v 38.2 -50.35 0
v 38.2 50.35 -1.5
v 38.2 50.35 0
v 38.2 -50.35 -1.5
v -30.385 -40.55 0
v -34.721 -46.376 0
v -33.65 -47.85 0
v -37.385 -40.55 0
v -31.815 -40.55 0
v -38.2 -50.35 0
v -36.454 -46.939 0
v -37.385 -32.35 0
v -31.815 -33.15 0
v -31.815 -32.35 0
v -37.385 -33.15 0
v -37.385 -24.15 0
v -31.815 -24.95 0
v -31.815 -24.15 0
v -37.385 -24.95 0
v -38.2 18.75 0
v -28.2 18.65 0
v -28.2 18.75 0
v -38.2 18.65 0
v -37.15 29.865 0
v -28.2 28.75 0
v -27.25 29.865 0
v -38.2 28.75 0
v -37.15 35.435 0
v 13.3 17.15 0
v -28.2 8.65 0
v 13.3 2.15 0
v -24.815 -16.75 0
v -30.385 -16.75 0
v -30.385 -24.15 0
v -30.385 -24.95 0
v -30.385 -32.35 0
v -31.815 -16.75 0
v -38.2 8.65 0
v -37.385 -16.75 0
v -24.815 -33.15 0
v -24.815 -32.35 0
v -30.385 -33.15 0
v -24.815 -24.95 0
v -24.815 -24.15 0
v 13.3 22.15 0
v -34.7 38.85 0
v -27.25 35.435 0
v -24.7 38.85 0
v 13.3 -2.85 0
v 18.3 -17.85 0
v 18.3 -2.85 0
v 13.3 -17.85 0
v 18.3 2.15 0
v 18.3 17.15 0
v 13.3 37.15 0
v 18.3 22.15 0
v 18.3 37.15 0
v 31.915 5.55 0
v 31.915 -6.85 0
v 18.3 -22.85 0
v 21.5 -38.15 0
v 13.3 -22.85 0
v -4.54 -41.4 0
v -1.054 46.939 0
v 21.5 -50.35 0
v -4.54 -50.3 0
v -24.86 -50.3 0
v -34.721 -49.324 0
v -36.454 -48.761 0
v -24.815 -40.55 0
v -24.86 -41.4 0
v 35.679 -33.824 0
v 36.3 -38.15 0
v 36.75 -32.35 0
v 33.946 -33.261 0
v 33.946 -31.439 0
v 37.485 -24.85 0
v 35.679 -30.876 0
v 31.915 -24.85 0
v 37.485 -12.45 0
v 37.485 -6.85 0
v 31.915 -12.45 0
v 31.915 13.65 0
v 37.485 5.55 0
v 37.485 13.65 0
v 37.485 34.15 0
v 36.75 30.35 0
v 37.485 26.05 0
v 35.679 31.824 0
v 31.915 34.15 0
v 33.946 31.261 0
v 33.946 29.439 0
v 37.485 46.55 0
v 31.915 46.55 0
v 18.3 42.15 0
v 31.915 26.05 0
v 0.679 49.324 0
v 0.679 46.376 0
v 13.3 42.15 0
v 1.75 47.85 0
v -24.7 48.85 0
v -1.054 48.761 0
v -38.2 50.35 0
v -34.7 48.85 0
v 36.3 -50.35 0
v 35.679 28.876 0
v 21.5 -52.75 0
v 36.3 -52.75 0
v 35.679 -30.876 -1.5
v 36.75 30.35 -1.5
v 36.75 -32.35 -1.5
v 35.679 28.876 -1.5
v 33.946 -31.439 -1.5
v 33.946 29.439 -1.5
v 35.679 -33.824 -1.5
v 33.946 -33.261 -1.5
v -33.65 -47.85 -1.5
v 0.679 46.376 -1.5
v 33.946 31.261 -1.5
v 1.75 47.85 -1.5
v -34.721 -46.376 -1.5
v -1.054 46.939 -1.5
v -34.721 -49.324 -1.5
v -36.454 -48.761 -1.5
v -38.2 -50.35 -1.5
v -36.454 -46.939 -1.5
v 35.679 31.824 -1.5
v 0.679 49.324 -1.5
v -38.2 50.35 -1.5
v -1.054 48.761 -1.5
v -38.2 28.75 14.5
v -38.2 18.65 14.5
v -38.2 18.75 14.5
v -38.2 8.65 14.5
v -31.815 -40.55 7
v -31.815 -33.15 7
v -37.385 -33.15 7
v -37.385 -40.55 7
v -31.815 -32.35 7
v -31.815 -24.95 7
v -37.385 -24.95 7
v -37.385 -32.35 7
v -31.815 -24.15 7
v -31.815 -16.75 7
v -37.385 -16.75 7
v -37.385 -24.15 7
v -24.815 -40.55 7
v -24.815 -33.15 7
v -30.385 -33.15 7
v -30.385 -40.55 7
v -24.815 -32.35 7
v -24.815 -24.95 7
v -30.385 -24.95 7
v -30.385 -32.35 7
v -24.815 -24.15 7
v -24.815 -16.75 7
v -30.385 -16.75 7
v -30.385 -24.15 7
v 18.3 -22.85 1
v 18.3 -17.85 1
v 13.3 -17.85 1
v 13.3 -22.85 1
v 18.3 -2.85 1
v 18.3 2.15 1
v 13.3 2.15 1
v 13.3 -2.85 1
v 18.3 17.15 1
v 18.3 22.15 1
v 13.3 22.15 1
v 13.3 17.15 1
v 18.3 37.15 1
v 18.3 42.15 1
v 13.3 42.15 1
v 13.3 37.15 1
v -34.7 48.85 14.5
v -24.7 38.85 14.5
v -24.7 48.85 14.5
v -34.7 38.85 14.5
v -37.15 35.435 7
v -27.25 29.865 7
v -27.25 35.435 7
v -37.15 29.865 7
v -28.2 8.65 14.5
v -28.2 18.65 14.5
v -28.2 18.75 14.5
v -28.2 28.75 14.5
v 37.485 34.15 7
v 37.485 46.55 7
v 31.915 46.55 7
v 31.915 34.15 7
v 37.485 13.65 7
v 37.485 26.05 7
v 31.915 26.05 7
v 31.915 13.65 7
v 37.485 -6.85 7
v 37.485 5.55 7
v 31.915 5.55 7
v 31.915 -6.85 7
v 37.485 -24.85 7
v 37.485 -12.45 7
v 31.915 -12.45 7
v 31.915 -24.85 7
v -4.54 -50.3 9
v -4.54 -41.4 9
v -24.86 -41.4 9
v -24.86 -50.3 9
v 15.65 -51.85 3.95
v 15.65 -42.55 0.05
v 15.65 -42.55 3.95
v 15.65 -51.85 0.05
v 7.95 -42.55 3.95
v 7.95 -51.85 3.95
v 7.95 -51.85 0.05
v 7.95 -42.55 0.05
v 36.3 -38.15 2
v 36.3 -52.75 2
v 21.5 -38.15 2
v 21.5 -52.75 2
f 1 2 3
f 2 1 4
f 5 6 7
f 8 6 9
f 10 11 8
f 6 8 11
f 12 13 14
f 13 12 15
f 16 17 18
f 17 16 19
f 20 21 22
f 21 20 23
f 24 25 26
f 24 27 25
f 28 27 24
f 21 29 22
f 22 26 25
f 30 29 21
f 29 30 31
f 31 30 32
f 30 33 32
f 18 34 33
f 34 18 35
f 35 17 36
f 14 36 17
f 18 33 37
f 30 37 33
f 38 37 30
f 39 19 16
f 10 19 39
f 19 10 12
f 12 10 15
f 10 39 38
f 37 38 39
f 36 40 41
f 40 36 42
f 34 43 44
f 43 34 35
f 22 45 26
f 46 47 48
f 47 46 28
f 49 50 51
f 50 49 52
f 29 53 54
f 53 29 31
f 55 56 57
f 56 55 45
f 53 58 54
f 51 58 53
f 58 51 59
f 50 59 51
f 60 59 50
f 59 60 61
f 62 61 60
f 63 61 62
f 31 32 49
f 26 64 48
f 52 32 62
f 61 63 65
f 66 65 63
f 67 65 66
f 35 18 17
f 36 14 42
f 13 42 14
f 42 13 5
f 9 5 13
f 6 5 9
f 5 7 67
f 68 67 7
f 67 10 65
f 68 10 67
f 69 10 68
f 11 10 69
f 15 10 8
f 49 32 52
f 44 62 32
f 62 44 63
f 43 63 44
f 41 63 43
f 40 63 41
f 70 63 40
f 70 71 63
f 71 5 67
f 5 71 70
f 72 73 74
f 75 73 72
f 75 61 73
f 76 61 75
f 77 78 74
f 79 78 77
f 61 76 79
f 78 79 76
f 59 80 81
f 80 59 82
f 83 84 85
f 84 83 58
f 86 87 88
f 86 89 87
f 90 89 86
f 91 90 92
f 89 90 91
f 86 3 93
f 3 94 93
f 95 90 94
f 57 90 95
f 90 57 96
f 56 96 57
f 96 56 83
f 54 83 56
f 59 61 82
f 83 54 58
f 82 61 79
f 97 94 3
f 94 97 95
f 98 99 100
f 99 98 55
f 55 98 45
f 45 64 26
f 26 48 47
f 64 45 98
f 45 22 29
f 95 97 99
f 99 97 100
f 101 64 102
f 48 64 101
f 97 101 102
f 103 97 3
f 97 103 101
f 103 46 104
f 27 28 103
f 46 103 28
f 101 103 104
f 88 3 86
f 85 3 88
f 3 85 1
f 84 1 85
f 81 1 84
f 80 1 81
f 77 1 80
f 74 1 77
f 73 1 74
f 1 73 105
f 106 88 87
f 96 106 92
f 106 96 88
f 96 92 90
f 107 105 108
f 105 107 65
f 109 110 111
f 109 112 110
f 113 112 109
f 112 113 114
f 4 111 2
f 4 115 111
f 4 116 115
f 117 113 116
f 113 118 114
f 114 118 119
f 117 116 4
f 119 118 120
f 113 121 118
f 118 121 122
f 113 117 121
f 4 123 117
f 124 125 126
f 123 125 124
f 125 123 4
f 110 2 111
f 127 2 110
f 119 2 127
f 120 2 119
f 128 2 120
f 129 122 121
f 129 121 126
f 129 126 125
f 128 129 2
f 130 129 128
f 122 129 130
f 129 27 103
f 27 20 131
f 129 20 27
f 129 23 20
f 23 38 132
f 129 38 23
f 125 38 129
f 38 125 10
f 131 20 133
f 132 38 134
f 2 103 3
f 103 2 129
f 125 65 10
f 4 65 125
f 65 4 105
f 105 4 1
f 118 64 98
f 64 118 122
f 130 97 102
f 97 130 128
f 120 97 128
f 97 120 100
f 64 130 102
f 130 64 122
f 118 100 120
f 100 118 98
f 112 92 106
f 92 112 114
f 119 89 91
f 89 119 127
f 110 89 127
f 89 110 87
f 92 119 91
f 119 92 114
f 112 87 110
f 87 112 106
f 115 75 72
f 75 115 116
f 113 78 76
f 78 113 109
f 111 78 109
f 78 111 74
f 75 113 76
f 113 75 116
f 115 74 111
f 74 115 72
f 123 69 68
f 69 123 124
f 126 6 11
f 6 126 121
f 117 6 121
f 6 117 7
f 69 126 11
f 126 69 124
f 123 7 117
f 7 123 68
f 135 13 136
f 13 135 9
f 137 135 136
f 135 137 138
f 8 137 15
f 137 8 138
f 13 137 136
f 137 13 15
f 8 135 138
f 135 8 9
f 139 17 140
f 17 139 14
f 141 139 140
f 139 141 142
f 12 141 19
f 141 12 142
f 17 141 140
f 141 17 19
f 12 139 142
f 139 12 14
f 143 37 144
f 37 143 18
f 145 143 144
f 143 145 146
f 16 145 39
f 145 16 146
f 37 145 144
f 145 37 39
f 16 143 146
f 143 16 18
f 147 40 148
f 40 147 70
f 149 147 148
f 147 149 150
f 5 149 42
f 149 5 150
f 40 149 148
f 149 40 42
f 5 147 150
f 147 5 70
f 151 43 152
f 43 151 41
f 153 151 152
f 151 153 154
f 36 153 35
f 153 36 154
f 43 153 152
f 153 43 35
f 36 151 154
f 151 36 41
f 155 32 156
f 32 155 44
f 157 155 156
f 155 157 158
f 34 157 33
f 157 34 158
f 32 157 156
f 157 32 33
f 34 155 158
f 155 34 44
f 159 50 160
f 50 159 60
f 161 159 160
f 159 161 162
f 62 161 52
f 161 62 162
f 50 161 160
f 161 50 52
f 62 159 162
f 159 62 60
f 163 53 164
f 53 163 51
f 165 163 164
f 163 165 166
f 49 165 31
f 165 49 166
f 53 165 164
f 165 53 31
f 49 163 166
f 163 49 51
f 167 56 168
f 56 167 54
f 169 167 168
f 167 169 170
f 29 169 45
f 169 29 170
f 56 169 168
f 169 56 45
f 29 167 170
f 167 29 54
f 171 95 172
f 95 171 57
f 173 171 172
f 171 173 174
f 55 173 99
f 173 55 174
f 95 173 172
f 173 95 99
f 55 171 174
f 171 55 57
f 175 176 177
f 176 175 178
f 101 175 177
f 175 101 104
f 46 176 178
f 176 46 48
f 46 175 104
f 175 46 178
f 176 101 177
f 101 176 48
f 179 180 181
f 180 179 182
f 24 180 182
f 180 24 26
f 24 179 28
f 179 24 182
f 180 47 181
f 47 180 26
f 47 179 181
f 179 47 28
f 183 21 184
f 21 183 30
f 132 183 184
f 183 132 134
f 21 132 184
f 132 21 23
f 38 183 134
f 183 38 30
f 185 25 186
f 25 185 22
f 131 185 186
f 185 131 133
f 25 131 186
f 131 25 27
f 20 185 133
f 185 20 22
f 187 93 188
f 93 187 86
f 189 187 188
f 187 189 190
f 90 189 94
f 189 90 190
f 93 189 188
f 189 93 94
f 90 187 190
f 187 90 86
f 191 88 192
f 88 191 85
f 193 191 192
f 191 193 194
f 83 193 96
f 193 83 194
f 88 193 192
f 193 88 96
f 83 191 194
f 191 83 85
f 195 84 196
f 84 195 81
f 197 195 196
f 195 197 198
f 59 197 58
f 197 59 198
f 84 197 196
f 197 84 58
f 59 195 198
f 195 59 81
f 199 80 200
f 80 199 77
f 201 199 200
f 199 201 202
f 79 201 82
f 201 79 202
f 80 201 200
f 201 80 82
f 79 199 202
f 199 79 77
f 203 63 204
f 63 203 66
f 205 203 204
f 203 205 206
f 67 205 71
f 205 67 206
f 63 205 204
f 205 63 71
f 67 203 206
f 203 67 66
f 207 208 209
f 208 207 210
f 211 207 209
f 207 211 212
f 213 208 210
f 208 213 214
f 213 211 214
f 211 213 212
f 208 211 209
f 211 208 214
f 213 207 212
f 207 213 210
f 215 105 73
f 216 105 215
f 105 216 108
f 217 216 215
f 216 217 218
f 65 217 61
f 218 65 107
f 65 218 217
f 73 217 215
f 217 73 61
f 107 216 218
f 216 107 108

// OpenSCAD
fudge=0.1;

enderPCB();

module enderPCB(){
  PCBwdth=76.4;
  PCBhght=100.7;
  PCBthck=1.5;
  translate([-PCBwdth/2,-PCBhght/2,0]){
    difference(){
      color("green") translate([0,0,-1.5]) cube([PCBwdth,PCBhght,PCBthck]);
      translate([38.4,PCBhght-2.5,-1.5-fudge/2]) cylinder(d=3.1,h=1.5+fudge);
      translate([PCBwdth-3,PCBhght-20,-1.5-fudge/2]) cylinder(d=3.1,h=1.5+fudge);
      translate([PCBwdth-3,18,-1.5-fudge/2]) cylinder(d=3.1,h=1.5+fudge);
      translate([3,2.5,-1.5-fudge/2]) cylinder(d=3.1,h=1.5+fudge);
    }
    translate([8.5,PCBhght-6.5,0]) rotate([0,0,90]) screwTerminal(); //VIN
    translate([6,83,0]) rotate([0,0,90]) jstXH(3); //Switch
    translate([5,64,0]) screwTerminal();
    translate([5,74.1,0]) screwTerminal();
    
    
    translate([PCBwdth-3.5,PCBhght-10,0]) jstXH(4);
    translate([PCBwdth-3.5,PCBhght-30.5,0]) jstXH(4);
    translate([PCBwdth-3.5,PCBhght-51,0]) jstXH(4);
    translate([PCBwdth-3.5,PCBhght-69,0]) jstXH(4);
    
    for (i=[0,7],j=[0,8.2,16.4]){
      translate([3.6+i,13.5+j,0]) jstXH(2);
    }
    
    for (i=[0,7],j=[0,8.2,16.4]){
      translate([3.6+i,13.5+j,0]) jstXH(2);
    }
    
    translate([23.5,4.5,0]) boxHeader(10);
    translate([50,9.3/2-1.5,0]) miniUSB();
    translate([74.5-14.8/2,14.6/2-2.4,0]) uSDslot();
    
    //Stepper driver
    for (i=[0:3]){
      color("black")
      translate([54,30+20*i,0.5]) cube([5,5,1],true);
    }
  }
}


module screwTerminal(){
  color ("lightgreen") translate([0,0,14.5/2]) cube([10,10,14.5],true);
}


module jstXH(pos){
  color("white") translate([0,0,3.5]) cube([5.57,(pos-1)*2.5+4.9,7],true);
}


module boxHeader(pos){
  color("darkgrey")
  translate([0,0,9/2]) cube([pos/2*2.54+7.62,8.9,9],true);
}

module miniUSB(){
  color("silver")
  translate([0,0,4/2]) cube([7.7,9.3,3.9],true);
}

module uSDslot(){
  color("silver")
  translate([0,0,1]) cube([14.8,14.6,2],true);
}
